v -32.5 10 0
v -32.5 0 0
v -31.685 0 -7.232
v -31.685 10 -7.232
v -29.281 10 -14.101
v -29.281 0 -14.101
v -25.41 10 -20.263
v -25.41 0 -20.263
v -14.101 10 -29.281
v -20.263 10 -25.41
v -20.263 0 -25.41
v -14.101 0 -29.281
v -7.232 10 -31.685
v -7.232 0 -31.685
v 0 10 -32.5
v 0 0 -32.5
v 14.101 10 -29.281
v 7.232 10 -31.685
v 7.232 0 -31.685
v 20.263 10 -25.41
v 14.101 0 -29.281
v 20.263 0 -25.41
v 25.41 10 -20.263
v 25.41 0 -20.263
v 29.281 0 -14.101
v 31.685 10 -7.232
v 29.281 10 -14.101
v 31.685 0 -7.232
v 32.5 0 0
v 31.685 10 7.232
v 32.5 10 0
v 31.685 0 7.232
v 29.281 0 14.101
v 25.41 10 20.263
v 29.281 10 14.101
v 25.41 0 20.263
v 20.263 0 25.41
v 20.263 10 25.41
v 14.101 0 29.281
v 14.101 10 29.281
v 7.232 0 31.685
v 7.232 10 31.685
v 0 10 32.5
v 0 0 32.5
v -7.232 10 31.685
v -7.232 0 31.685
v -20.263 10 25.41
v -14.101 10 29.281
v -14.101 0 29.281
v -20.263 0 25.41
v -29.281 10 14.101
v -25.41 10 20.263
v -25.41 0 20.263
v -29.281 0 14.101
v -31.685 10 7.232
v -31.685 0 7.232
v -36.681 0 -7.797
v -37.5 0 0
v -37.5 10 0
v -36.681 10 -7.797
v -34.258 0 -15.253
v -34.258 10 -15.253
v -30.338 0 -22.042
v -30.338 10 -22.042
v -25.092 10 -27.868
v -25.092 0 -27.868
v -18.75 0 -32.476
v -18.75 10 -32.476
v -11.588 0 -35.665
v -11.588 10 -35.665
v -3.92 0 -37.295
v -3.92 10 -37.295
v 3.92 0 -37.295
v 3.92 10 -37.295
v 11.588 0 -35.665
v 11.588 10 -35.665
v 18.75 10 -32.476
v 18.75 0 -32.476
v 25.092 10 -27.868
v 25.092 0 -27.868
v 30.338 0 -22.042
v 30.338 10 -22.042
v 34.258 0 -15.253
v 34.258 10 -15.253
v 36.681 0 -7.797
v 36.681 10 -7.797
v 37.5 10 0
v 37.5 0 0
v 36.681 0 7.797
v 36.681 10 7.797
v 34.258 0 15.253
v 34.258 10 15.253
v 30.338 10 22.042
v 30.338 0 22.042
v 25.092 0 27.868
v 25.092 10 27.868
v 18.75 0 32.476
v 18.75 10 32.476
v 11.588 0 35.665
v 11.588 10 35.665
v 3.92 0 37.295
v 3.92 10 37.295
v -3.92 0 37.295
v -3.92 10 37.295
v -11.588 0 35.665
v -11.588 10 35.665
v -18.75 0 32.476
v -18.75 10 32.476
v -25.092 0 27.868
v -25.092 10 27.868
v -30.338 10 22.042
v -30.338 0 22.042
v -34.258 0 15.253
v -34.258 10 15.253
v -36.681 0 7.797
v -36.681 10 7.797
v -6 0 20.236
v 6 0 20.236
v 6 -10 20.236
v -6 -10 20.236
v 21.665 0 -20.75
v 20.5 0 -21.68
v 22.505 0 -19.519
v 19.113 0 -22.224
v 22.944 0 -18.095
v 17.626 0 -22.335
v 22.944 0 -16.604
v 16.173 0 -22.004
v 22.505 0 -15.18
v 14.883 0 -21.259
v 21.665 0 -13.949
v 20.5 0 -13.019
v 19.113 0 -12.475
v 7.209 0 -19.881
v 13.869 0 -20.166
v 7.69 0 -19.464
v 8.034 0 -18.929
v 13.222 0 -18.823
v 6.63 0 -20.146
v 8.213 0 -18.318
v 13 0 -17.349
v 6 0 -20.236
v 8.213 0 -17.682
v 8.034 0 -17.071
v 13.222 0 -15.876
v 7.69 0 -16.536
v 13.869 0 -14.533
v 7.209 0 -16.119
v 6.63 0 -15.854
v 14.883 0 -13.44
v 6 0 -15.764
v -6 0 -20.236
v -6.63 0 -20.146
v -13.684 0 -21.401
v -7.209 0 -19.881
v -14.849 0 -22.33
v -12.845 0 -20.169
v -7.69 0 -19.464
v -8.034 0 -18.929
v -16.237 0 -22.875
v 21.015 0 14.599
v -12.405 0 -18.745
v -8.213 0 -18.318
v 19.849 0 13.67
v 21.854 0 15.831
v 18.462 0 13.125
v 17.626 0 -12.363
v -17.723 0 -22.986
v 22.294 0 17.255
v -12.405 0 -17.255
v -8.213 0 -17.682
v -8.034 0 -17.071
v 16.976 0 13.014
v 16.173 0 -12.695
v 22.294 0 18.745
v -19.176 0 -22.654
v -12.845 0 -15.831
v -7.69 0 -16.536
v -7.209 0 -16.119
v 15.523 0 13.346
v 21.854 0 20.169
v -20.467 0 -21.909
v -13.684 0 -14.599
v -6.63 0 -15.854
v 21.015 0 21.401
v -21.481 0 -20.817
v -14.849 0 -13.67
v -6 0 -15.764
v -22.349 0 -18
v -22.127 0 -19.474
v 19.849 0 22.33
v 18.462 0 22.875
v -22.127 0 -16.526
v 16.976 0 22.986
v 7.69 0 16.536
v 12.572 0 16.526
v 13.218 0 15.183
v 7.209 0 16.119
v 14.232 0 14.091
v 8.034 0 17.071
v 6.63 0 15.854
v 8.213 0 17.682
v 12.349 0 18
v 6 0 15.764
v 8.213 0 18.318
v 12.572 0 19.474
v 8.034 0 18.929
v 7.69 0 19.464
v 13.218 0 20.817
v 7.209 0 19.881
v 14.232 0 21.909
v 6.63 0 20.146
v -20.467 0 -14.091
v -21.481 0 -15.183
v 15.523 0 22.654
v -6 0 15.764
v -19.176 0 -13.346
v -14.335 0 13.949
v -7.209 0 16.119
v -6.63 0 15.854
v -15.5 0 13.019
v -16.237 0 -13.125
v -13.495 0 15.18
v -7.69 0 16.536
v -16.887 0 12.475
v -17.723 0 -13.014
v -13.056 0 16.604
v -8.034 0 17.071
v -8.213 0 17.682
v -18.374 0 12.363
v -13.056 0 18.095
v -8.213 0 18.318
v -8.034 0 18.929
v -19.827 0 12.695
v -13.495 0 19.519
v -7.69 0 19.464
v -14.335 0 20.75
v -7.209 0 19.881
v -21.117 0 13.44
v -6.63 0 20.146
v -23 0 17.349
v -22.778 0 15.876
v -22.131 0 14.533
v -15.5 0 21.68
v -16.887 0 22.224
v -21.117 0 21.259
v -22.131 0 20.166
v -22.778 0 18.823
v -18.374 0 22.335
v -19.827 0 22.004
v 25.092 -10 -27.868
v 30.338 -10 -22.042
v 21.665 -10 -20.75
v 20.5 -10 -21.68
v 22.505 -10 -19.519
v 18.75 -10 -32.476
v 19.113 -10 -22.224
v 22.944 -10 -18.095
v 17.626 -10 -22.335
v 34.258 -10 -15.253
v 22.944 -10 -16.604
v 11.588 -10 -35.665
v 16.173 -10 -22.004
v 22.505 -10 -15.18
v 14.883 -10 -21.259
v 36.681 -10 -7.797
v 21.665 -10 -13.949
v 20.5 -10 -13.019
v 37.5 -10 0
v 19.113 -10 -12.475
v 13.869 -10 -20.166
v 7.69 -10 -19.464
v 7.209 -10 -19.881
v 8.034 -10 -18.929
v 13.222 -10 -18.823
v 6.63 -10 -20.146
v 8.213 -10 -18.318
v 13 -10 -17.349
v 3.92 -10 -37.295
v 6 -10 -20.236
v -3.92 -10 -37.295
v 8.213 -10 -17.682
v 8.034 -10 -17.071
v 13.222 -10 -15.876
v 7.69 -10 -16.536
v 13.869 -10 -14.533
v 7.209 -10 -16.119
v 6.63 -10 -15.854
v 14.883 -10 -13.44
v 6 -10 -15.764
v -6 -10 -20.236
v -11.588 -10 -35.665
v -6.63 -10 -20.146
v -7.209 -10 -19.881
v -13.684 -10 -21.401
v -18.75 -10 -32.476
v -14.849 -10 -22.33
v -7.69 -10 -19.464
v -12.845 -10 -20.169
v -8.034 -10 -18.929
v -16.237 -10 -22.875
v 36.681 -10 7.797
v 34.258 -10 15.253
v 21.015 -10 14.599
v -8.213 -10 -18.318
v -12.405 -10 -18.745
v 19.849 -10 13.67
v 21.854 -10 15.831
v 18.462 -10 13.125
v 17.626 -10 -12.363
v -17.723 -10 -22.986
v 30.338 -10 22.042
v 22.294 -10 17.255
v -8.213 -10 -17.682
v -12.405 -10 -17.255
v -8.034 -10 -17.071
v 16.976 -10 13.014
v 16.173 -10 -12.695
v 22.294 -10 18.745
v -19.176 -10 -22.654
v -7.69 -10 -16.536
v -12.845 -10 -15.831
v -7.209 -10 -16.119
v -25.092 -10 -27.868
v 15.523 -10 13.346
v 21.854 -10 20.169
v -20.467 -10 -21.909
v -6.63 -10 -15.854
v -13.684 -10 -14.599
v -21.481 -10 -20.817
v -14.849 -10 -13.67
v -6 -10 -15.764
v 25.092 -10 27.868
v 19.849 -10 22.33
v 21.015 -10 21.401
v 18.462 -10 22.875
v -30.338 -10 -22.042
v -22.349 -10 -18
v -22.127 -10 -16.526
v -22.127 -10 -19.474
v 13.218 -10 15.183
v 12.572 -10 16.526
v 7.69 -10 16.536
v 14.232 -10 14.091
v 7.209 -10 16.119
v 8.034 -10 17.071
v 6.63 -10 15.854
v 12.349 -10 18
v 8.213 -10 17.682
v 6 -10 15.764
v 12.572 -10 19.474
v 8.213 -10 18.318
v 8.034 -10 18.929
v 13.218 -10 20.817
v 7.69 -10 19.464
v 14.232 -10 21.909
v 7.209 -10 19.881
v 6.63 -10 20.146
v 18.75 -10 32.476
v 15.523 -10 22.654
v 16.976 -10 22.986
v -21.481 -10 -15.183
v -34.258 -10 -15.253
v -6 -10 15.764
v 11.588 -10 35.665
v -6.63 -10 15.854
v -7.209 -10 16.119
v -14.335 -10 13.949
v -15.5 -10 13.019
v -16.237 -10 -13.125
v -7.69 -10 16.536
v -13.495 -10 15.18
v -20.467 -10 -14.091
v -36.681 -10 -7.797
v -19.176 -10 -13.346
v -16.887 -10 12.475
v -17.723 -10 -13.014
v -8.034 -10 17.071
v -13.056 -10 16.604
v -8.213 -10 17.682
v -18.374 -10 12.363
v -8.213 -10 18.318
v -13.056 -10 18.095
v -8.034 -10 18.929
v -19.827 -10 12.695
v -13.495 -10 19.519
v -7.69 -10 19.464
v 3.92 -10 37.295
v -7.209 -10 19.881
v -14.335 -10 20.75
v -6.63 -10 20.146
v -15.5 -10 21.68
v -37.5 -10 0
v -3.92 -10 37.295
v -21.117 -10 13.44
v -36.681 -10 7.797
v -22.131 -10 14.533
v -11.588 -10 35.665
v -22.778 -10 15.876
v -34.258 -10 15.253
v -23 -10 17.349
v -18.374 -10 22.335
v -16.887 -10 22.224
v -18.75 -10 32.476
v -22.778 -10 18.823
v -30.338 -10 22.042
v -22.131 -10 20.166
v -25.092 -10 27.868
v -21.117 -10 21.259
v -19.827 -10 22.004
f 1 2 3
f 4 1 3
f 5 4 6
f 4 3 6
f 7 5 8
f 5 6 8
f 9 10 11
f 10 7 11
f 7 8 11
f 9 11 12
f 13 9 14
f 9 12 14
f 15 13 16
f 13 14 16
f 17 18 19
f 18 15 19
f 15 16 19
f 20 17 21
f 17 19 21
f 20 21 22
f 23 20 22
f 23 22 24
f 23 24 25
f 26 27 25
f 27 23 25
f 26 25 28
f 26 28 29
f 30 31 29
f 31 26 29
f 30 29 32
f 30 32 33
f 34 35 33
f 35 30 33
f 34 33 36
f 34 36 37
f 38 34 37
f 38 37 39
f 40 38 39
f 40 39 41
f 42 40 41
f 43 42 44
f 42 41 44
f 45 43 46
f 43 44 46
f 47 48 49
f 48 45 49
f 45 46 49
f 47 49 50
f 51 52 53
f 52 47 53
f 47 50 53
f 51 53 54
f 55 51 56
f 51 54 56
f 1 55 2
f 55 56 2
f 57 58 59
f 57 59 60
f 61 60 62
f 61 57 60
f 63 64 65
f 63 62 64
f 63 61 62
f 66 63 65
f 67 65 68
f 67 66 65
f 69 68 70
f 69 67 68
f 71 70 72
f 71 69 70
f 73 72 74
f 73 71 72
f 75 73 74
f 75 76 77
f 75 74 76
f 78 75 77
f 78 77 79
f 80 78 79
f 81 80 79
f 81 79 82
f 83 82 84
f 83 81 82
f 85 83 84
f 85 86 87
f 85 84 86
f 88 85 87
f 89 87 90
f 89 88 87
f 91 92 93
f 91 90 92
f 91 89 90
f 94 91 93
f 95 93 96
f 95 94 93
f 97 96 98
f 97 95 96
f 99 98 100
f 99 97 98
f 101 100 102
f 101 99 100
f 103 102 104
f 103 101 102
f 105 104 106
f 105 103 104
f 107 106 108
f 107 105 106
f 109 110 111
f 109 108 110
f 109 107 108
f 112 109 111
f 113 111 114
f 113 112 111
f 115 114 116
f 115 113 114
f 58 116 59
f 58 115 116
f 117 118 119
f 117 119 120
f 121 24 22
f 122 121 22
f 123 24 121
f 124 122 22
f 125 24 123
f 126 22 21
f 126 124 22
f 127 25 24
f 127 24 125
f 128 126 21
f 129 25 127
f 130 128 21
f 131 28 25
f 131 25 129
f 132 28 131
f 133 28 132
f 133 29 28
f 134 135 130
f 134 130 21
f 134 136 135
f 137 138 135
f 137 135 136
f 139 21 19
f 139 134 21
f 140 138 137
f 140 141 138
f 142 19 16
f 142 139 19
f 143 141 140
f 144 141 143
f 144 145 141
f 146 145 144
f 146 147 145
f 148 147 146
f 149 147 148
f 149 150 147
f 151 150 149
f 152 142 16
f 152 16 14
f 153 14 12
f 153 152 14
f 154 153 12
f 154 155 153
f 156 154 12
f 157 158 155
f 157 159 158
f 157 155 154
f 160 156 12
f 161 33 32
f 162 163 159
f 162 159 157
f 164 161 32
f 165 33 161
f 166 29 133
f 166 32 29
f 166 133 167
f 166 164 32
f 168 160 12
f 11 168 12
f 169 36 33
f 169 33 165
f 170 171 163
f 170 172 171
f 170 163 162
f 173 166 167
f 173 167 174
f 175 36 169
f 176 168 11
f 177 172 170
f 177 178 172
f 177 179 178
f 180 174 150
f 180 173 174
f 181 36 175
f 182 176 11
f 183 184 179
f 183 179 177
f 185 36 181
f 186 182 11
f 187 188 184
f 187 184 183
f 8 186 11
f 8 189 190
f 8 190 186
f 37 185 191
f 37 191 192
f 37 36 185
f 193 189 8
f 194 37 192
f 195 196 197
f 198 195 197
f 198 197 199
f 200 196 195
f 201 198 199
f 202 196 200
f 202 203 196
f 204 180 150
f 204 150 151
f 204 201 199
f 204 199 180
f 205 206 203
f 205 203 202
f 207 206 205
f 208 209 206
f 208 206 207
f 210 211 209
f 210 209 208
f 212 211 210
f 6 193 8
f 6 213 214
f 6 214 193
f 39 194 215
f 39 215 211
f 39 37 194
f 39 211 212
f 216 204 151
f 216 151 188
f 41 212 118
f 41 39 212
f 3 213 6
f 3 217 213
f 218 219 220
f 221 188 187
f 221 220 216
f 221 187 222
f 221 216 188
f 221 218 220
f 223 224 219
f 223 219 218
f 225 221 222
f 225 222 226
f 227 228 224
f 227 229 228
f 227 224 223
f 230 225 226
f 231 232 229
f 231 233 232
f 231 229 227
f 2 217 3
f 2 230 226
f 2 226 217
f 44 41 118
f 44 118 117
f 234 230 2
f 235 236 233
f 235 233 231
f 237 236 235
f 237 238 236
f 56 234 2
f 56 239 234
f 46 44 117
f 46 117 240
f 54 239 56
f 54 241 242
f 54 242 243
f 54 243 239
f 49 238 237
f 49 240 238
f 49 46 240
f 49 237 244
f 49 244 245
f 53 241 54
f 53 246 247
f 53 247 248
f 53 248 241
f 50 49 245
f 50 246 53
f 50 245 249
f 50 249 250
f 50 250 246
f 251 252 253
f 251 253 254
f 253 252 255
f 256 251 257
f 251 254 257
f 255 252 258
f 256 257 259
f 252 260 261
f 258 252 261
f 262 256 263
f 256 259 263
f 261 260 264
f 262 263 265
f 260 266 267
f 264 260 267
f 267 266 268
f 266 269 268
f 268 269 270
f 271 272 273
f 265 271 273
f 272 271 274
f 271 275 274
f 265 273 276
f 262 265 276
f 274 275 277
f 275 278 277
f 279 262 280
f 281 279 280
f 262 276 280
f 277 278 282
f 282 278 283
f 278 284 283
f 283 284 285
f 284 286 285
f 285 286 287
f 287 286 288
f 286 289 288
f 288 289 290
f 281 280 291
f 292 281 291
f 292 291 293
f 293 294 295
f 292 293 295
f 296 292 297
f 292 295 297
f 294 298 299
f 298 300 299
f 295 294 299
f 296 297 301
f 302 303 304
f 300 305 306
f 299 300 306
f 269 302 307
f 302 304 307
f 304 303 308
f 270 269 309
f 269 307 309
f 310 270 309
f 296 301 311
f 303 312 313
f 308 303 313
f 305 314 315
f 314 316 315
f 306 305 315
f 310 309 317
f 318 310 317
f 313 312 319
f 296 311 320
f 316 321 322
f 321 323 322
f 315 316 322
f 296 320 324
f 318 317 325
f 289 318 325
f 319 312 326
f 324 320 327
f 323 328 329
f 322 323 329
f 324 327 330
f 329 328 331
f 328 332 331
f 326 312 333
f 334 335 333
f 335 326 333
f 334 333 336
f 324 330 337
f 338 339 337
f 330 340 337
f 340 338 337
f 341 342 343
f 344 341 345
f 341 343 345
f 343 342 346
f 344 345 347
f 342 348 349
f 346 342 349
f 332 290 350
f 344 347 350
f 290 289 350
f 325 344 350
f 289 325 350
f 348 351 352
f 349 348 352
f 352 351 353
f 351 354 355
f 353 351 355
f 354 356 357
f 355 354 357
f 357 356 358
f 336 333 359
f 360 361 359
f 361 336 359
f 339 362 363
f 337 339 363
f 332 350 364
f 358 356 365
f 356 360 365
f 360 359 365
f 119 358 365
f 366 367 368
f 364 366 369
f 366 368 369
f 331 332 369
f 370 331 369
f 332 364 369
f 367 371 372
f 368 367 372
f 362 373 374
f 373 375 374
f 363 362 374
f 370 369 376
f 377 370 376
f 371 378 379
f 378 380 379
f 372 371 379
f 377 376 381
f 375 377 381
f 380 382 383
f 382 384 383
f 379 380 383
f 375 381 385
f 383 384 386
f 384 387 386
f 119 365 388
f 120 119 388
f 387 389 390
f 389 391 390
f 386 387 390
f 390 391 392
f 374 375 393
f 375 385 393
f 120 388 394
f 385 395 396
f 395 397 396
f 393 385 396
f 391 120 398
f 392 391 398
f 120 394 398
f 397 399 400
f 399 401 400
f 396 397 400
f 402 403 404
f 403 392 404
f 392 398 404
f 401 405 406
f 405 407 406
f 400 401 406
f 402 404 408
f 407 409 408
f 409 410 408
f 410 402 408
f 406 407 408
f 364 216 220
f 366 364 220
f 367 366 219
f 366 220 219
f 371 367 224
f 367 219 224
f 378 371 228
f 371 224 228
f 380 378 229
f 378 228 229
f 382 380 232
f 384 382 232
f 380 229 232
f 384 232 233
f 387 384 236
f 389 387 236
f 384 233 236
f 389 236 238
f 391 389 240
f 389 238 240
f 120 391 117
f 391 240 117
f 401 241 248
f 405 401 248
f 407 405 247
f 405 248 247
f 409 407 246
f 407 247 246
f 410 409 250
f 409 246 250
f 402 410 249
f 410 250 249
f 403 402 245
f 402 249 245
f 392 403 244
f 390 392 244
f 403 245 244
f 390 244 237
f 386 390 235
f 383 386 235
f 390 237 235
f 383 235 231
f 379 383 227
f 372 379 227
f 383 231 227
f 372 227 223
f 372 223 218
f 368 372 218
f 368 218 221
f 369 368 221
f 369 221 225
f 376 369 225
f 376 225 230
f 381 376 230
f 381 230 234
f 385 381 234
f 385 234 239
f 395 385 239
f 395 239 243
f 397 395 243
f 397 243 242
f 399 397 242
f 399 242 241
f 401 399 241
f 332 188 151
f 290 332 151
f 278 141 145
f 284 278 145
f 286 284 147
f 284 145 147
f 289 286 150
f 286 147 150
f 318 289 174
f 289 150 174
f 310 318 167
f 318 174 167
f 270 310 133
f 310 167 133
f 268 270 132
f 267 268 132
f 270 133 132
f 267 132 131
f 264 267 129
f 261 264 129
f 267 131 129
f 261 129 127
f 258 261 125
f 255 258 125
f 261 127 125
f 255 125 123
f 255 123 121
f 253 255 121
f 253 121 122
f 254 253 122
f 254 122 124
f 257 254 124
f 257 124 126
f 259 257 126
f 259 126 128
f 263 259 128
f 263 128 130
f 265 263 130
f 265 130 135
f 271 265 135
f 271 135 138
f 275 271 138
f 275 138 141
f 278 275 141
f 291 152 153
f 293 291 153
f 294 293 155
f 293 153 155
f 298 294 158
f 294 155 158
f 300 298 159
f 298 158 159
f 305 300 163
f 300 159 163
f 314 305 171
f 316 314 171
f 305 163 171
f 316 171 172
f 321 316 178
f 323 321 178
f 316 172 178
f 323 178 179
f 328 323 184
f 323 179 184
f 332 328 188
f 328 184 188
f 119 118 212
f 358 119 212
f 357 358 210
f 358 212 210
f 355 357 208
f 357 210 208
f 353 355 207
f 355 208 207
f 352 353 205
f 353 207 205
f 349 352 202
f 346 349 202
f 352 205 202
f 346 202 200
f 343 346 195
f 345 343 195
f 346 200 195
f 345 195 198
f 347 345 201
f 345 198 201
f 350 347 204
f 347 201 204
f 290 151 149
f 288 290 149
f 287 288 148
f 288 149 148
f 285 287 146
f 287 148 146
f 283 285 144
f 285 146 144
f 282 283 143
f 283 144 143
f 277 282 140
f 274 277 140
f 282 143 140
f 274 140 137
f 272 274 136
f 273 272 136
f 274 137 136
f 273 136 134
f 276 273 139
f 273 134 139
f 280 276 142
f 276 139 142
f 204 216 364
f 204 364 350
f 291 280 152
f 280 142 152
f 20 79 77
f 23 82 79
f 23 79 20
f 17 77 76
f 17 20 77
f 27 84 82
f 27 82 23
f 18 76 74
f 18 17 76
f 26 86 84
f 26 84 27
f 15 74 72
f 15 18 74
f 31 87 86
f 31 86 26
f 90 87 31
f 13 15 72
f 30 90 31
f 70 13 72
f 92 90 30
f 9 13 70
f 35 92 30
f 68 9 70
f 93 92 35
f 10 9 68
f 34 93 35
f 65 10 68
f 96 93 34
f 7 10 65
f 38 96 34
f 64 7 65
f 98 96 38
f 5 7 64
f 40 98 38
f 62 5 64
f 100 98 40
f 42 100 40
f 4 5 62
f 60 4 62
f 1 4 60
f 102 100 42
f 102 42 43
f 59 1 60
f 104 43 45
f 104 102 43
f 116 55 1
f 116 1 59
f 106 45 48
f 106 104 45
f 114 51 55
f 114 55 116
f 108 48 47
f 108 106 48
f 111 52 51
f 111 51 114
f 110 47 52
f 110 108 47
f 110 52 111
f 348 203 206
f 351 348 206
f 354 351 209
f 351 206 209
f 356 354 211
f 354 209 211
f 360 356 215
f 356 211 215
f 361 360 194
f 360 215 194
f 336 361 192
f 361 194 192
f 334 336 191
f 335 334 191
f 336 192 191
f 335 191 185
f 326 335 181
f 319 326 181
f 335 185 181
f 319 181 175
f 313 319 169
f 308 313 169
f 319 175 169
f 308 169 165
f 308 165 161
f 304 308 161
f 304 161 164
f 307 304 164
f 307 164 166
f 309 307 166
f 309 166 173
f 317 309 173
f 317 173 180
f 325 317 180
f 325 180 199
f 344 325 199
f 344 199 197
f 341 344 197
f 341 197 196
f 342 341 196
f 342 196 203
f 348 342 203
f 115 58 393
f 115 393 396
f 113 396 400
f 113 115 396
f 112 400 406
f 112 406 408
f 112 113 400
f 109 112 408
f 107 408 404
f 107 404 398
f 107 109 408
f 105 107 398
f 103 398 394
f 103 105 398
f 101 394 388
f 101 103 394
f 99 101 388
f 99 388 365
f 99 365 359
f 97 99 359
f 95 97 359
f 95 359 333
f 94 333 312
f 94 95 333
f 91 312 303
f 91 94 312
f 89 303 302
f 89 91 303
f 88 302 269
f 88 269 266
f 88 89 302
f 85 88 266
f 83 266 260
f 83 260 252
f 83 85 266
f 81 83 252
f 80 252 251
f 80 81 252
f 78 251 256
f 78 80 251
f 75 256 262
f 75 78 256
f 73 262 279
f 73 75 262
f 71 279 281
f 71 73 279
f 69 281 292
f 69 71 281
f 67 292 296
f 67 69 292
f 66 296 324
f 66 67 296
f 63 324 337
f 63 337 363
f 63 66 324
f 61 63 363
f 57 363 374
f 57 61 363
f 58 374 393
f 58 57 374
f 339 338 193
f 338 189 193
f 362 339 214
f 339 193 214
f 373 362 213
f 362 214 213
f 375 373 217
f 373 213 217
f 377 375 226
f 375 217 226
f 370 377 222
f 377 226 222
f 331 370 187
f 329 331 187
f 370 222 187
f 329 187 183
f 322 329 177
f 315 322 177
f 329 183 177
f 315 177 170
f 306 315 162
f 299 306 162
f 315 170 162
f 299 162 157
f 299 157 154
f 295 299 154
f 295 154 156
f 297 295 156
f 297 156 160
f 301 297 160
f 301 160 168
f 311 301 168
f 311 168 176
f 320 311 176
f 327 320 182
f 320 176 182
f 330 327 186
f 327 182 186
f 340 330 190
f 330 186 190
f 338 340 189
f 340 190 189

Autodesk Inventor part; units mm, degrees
ref_plane "YZ Plane" through (0, 0, 0) normal (1, 0, 0) x (0, 1, 0)
ref_plane "XZ Plane" through (0, 0, 0) normal (0, 1, 0) x (-1, 0, 0)
ref_plane "XY Plane" through (0, 0, 0) normal (0, 0, 1) x (1, 0, 0)
sketch "Sketch1" plane through (0, 0, 0) normal (0, 1, 0) x (-1, 0, 0)
  circle A0 centre (0, 0) radius 32.5
  circle A1 centre (0, 0) radius 25
  circle A2 centre (17.3494, -18) radius 5
  circle A3 centre (18, 17.3494) radius 5
  circle A4 centre (-17.3494, 18) radius 5
  circle A5 centre (-18, -17.3494) radius 5
  line L0 (6, -18) -> (-6, -18) construction
  line L1 (6, -15.7639) -> (-6, -15.7639)
  line L2 (-6, -20.2361) -> (6, -20.2361)
  arc A6 (6, -20.2361) -> (6, -15.7639) centre (6, -18) ccw
  arc A7 (-6, -15.7639) -> (-6, -20.2361) centre (-6, -18) ccw
  line L3 (-25, 0) -> (25, 0) construction
  line L4 (6, 15.7639) -> (-6, 15.7639)
  line L5 (-6, 20.2361) -> (6, 20.2361)
  arc A8 (6, 15.7639) -> (6, 20.2361) centre (6, 18) ccw
  arc A9 (-6, 20.2361) -> (-6, 15.7639) centre (-6, 18) ccw
  circle A10 centre (0, 0) radius 37.5
  point P0 (0, -18)
  dimension "d0" = 65
  dimension "d1" = 50
  dimension "d2" = 10
  dimension "d5" = 360
  dimension "d7" = 35.3494
  dimension "d11" = 17.3494
  dimension "d12" = 11.3493
  dimension "d16" = 18
  dimension "d17" = 2.2361
  dimension "d18" = 18
  dimension "d19" = 75
extrude "Extrusion1" add sketch "Sketch1" against normal blind 10 contours A0 | A1 A2 A5 A4 A3
extrude "Extrusion2" add sketch "Sketch1" along normal blind 10 and the other way blind 10 contours A10
properties part number "case_top"
